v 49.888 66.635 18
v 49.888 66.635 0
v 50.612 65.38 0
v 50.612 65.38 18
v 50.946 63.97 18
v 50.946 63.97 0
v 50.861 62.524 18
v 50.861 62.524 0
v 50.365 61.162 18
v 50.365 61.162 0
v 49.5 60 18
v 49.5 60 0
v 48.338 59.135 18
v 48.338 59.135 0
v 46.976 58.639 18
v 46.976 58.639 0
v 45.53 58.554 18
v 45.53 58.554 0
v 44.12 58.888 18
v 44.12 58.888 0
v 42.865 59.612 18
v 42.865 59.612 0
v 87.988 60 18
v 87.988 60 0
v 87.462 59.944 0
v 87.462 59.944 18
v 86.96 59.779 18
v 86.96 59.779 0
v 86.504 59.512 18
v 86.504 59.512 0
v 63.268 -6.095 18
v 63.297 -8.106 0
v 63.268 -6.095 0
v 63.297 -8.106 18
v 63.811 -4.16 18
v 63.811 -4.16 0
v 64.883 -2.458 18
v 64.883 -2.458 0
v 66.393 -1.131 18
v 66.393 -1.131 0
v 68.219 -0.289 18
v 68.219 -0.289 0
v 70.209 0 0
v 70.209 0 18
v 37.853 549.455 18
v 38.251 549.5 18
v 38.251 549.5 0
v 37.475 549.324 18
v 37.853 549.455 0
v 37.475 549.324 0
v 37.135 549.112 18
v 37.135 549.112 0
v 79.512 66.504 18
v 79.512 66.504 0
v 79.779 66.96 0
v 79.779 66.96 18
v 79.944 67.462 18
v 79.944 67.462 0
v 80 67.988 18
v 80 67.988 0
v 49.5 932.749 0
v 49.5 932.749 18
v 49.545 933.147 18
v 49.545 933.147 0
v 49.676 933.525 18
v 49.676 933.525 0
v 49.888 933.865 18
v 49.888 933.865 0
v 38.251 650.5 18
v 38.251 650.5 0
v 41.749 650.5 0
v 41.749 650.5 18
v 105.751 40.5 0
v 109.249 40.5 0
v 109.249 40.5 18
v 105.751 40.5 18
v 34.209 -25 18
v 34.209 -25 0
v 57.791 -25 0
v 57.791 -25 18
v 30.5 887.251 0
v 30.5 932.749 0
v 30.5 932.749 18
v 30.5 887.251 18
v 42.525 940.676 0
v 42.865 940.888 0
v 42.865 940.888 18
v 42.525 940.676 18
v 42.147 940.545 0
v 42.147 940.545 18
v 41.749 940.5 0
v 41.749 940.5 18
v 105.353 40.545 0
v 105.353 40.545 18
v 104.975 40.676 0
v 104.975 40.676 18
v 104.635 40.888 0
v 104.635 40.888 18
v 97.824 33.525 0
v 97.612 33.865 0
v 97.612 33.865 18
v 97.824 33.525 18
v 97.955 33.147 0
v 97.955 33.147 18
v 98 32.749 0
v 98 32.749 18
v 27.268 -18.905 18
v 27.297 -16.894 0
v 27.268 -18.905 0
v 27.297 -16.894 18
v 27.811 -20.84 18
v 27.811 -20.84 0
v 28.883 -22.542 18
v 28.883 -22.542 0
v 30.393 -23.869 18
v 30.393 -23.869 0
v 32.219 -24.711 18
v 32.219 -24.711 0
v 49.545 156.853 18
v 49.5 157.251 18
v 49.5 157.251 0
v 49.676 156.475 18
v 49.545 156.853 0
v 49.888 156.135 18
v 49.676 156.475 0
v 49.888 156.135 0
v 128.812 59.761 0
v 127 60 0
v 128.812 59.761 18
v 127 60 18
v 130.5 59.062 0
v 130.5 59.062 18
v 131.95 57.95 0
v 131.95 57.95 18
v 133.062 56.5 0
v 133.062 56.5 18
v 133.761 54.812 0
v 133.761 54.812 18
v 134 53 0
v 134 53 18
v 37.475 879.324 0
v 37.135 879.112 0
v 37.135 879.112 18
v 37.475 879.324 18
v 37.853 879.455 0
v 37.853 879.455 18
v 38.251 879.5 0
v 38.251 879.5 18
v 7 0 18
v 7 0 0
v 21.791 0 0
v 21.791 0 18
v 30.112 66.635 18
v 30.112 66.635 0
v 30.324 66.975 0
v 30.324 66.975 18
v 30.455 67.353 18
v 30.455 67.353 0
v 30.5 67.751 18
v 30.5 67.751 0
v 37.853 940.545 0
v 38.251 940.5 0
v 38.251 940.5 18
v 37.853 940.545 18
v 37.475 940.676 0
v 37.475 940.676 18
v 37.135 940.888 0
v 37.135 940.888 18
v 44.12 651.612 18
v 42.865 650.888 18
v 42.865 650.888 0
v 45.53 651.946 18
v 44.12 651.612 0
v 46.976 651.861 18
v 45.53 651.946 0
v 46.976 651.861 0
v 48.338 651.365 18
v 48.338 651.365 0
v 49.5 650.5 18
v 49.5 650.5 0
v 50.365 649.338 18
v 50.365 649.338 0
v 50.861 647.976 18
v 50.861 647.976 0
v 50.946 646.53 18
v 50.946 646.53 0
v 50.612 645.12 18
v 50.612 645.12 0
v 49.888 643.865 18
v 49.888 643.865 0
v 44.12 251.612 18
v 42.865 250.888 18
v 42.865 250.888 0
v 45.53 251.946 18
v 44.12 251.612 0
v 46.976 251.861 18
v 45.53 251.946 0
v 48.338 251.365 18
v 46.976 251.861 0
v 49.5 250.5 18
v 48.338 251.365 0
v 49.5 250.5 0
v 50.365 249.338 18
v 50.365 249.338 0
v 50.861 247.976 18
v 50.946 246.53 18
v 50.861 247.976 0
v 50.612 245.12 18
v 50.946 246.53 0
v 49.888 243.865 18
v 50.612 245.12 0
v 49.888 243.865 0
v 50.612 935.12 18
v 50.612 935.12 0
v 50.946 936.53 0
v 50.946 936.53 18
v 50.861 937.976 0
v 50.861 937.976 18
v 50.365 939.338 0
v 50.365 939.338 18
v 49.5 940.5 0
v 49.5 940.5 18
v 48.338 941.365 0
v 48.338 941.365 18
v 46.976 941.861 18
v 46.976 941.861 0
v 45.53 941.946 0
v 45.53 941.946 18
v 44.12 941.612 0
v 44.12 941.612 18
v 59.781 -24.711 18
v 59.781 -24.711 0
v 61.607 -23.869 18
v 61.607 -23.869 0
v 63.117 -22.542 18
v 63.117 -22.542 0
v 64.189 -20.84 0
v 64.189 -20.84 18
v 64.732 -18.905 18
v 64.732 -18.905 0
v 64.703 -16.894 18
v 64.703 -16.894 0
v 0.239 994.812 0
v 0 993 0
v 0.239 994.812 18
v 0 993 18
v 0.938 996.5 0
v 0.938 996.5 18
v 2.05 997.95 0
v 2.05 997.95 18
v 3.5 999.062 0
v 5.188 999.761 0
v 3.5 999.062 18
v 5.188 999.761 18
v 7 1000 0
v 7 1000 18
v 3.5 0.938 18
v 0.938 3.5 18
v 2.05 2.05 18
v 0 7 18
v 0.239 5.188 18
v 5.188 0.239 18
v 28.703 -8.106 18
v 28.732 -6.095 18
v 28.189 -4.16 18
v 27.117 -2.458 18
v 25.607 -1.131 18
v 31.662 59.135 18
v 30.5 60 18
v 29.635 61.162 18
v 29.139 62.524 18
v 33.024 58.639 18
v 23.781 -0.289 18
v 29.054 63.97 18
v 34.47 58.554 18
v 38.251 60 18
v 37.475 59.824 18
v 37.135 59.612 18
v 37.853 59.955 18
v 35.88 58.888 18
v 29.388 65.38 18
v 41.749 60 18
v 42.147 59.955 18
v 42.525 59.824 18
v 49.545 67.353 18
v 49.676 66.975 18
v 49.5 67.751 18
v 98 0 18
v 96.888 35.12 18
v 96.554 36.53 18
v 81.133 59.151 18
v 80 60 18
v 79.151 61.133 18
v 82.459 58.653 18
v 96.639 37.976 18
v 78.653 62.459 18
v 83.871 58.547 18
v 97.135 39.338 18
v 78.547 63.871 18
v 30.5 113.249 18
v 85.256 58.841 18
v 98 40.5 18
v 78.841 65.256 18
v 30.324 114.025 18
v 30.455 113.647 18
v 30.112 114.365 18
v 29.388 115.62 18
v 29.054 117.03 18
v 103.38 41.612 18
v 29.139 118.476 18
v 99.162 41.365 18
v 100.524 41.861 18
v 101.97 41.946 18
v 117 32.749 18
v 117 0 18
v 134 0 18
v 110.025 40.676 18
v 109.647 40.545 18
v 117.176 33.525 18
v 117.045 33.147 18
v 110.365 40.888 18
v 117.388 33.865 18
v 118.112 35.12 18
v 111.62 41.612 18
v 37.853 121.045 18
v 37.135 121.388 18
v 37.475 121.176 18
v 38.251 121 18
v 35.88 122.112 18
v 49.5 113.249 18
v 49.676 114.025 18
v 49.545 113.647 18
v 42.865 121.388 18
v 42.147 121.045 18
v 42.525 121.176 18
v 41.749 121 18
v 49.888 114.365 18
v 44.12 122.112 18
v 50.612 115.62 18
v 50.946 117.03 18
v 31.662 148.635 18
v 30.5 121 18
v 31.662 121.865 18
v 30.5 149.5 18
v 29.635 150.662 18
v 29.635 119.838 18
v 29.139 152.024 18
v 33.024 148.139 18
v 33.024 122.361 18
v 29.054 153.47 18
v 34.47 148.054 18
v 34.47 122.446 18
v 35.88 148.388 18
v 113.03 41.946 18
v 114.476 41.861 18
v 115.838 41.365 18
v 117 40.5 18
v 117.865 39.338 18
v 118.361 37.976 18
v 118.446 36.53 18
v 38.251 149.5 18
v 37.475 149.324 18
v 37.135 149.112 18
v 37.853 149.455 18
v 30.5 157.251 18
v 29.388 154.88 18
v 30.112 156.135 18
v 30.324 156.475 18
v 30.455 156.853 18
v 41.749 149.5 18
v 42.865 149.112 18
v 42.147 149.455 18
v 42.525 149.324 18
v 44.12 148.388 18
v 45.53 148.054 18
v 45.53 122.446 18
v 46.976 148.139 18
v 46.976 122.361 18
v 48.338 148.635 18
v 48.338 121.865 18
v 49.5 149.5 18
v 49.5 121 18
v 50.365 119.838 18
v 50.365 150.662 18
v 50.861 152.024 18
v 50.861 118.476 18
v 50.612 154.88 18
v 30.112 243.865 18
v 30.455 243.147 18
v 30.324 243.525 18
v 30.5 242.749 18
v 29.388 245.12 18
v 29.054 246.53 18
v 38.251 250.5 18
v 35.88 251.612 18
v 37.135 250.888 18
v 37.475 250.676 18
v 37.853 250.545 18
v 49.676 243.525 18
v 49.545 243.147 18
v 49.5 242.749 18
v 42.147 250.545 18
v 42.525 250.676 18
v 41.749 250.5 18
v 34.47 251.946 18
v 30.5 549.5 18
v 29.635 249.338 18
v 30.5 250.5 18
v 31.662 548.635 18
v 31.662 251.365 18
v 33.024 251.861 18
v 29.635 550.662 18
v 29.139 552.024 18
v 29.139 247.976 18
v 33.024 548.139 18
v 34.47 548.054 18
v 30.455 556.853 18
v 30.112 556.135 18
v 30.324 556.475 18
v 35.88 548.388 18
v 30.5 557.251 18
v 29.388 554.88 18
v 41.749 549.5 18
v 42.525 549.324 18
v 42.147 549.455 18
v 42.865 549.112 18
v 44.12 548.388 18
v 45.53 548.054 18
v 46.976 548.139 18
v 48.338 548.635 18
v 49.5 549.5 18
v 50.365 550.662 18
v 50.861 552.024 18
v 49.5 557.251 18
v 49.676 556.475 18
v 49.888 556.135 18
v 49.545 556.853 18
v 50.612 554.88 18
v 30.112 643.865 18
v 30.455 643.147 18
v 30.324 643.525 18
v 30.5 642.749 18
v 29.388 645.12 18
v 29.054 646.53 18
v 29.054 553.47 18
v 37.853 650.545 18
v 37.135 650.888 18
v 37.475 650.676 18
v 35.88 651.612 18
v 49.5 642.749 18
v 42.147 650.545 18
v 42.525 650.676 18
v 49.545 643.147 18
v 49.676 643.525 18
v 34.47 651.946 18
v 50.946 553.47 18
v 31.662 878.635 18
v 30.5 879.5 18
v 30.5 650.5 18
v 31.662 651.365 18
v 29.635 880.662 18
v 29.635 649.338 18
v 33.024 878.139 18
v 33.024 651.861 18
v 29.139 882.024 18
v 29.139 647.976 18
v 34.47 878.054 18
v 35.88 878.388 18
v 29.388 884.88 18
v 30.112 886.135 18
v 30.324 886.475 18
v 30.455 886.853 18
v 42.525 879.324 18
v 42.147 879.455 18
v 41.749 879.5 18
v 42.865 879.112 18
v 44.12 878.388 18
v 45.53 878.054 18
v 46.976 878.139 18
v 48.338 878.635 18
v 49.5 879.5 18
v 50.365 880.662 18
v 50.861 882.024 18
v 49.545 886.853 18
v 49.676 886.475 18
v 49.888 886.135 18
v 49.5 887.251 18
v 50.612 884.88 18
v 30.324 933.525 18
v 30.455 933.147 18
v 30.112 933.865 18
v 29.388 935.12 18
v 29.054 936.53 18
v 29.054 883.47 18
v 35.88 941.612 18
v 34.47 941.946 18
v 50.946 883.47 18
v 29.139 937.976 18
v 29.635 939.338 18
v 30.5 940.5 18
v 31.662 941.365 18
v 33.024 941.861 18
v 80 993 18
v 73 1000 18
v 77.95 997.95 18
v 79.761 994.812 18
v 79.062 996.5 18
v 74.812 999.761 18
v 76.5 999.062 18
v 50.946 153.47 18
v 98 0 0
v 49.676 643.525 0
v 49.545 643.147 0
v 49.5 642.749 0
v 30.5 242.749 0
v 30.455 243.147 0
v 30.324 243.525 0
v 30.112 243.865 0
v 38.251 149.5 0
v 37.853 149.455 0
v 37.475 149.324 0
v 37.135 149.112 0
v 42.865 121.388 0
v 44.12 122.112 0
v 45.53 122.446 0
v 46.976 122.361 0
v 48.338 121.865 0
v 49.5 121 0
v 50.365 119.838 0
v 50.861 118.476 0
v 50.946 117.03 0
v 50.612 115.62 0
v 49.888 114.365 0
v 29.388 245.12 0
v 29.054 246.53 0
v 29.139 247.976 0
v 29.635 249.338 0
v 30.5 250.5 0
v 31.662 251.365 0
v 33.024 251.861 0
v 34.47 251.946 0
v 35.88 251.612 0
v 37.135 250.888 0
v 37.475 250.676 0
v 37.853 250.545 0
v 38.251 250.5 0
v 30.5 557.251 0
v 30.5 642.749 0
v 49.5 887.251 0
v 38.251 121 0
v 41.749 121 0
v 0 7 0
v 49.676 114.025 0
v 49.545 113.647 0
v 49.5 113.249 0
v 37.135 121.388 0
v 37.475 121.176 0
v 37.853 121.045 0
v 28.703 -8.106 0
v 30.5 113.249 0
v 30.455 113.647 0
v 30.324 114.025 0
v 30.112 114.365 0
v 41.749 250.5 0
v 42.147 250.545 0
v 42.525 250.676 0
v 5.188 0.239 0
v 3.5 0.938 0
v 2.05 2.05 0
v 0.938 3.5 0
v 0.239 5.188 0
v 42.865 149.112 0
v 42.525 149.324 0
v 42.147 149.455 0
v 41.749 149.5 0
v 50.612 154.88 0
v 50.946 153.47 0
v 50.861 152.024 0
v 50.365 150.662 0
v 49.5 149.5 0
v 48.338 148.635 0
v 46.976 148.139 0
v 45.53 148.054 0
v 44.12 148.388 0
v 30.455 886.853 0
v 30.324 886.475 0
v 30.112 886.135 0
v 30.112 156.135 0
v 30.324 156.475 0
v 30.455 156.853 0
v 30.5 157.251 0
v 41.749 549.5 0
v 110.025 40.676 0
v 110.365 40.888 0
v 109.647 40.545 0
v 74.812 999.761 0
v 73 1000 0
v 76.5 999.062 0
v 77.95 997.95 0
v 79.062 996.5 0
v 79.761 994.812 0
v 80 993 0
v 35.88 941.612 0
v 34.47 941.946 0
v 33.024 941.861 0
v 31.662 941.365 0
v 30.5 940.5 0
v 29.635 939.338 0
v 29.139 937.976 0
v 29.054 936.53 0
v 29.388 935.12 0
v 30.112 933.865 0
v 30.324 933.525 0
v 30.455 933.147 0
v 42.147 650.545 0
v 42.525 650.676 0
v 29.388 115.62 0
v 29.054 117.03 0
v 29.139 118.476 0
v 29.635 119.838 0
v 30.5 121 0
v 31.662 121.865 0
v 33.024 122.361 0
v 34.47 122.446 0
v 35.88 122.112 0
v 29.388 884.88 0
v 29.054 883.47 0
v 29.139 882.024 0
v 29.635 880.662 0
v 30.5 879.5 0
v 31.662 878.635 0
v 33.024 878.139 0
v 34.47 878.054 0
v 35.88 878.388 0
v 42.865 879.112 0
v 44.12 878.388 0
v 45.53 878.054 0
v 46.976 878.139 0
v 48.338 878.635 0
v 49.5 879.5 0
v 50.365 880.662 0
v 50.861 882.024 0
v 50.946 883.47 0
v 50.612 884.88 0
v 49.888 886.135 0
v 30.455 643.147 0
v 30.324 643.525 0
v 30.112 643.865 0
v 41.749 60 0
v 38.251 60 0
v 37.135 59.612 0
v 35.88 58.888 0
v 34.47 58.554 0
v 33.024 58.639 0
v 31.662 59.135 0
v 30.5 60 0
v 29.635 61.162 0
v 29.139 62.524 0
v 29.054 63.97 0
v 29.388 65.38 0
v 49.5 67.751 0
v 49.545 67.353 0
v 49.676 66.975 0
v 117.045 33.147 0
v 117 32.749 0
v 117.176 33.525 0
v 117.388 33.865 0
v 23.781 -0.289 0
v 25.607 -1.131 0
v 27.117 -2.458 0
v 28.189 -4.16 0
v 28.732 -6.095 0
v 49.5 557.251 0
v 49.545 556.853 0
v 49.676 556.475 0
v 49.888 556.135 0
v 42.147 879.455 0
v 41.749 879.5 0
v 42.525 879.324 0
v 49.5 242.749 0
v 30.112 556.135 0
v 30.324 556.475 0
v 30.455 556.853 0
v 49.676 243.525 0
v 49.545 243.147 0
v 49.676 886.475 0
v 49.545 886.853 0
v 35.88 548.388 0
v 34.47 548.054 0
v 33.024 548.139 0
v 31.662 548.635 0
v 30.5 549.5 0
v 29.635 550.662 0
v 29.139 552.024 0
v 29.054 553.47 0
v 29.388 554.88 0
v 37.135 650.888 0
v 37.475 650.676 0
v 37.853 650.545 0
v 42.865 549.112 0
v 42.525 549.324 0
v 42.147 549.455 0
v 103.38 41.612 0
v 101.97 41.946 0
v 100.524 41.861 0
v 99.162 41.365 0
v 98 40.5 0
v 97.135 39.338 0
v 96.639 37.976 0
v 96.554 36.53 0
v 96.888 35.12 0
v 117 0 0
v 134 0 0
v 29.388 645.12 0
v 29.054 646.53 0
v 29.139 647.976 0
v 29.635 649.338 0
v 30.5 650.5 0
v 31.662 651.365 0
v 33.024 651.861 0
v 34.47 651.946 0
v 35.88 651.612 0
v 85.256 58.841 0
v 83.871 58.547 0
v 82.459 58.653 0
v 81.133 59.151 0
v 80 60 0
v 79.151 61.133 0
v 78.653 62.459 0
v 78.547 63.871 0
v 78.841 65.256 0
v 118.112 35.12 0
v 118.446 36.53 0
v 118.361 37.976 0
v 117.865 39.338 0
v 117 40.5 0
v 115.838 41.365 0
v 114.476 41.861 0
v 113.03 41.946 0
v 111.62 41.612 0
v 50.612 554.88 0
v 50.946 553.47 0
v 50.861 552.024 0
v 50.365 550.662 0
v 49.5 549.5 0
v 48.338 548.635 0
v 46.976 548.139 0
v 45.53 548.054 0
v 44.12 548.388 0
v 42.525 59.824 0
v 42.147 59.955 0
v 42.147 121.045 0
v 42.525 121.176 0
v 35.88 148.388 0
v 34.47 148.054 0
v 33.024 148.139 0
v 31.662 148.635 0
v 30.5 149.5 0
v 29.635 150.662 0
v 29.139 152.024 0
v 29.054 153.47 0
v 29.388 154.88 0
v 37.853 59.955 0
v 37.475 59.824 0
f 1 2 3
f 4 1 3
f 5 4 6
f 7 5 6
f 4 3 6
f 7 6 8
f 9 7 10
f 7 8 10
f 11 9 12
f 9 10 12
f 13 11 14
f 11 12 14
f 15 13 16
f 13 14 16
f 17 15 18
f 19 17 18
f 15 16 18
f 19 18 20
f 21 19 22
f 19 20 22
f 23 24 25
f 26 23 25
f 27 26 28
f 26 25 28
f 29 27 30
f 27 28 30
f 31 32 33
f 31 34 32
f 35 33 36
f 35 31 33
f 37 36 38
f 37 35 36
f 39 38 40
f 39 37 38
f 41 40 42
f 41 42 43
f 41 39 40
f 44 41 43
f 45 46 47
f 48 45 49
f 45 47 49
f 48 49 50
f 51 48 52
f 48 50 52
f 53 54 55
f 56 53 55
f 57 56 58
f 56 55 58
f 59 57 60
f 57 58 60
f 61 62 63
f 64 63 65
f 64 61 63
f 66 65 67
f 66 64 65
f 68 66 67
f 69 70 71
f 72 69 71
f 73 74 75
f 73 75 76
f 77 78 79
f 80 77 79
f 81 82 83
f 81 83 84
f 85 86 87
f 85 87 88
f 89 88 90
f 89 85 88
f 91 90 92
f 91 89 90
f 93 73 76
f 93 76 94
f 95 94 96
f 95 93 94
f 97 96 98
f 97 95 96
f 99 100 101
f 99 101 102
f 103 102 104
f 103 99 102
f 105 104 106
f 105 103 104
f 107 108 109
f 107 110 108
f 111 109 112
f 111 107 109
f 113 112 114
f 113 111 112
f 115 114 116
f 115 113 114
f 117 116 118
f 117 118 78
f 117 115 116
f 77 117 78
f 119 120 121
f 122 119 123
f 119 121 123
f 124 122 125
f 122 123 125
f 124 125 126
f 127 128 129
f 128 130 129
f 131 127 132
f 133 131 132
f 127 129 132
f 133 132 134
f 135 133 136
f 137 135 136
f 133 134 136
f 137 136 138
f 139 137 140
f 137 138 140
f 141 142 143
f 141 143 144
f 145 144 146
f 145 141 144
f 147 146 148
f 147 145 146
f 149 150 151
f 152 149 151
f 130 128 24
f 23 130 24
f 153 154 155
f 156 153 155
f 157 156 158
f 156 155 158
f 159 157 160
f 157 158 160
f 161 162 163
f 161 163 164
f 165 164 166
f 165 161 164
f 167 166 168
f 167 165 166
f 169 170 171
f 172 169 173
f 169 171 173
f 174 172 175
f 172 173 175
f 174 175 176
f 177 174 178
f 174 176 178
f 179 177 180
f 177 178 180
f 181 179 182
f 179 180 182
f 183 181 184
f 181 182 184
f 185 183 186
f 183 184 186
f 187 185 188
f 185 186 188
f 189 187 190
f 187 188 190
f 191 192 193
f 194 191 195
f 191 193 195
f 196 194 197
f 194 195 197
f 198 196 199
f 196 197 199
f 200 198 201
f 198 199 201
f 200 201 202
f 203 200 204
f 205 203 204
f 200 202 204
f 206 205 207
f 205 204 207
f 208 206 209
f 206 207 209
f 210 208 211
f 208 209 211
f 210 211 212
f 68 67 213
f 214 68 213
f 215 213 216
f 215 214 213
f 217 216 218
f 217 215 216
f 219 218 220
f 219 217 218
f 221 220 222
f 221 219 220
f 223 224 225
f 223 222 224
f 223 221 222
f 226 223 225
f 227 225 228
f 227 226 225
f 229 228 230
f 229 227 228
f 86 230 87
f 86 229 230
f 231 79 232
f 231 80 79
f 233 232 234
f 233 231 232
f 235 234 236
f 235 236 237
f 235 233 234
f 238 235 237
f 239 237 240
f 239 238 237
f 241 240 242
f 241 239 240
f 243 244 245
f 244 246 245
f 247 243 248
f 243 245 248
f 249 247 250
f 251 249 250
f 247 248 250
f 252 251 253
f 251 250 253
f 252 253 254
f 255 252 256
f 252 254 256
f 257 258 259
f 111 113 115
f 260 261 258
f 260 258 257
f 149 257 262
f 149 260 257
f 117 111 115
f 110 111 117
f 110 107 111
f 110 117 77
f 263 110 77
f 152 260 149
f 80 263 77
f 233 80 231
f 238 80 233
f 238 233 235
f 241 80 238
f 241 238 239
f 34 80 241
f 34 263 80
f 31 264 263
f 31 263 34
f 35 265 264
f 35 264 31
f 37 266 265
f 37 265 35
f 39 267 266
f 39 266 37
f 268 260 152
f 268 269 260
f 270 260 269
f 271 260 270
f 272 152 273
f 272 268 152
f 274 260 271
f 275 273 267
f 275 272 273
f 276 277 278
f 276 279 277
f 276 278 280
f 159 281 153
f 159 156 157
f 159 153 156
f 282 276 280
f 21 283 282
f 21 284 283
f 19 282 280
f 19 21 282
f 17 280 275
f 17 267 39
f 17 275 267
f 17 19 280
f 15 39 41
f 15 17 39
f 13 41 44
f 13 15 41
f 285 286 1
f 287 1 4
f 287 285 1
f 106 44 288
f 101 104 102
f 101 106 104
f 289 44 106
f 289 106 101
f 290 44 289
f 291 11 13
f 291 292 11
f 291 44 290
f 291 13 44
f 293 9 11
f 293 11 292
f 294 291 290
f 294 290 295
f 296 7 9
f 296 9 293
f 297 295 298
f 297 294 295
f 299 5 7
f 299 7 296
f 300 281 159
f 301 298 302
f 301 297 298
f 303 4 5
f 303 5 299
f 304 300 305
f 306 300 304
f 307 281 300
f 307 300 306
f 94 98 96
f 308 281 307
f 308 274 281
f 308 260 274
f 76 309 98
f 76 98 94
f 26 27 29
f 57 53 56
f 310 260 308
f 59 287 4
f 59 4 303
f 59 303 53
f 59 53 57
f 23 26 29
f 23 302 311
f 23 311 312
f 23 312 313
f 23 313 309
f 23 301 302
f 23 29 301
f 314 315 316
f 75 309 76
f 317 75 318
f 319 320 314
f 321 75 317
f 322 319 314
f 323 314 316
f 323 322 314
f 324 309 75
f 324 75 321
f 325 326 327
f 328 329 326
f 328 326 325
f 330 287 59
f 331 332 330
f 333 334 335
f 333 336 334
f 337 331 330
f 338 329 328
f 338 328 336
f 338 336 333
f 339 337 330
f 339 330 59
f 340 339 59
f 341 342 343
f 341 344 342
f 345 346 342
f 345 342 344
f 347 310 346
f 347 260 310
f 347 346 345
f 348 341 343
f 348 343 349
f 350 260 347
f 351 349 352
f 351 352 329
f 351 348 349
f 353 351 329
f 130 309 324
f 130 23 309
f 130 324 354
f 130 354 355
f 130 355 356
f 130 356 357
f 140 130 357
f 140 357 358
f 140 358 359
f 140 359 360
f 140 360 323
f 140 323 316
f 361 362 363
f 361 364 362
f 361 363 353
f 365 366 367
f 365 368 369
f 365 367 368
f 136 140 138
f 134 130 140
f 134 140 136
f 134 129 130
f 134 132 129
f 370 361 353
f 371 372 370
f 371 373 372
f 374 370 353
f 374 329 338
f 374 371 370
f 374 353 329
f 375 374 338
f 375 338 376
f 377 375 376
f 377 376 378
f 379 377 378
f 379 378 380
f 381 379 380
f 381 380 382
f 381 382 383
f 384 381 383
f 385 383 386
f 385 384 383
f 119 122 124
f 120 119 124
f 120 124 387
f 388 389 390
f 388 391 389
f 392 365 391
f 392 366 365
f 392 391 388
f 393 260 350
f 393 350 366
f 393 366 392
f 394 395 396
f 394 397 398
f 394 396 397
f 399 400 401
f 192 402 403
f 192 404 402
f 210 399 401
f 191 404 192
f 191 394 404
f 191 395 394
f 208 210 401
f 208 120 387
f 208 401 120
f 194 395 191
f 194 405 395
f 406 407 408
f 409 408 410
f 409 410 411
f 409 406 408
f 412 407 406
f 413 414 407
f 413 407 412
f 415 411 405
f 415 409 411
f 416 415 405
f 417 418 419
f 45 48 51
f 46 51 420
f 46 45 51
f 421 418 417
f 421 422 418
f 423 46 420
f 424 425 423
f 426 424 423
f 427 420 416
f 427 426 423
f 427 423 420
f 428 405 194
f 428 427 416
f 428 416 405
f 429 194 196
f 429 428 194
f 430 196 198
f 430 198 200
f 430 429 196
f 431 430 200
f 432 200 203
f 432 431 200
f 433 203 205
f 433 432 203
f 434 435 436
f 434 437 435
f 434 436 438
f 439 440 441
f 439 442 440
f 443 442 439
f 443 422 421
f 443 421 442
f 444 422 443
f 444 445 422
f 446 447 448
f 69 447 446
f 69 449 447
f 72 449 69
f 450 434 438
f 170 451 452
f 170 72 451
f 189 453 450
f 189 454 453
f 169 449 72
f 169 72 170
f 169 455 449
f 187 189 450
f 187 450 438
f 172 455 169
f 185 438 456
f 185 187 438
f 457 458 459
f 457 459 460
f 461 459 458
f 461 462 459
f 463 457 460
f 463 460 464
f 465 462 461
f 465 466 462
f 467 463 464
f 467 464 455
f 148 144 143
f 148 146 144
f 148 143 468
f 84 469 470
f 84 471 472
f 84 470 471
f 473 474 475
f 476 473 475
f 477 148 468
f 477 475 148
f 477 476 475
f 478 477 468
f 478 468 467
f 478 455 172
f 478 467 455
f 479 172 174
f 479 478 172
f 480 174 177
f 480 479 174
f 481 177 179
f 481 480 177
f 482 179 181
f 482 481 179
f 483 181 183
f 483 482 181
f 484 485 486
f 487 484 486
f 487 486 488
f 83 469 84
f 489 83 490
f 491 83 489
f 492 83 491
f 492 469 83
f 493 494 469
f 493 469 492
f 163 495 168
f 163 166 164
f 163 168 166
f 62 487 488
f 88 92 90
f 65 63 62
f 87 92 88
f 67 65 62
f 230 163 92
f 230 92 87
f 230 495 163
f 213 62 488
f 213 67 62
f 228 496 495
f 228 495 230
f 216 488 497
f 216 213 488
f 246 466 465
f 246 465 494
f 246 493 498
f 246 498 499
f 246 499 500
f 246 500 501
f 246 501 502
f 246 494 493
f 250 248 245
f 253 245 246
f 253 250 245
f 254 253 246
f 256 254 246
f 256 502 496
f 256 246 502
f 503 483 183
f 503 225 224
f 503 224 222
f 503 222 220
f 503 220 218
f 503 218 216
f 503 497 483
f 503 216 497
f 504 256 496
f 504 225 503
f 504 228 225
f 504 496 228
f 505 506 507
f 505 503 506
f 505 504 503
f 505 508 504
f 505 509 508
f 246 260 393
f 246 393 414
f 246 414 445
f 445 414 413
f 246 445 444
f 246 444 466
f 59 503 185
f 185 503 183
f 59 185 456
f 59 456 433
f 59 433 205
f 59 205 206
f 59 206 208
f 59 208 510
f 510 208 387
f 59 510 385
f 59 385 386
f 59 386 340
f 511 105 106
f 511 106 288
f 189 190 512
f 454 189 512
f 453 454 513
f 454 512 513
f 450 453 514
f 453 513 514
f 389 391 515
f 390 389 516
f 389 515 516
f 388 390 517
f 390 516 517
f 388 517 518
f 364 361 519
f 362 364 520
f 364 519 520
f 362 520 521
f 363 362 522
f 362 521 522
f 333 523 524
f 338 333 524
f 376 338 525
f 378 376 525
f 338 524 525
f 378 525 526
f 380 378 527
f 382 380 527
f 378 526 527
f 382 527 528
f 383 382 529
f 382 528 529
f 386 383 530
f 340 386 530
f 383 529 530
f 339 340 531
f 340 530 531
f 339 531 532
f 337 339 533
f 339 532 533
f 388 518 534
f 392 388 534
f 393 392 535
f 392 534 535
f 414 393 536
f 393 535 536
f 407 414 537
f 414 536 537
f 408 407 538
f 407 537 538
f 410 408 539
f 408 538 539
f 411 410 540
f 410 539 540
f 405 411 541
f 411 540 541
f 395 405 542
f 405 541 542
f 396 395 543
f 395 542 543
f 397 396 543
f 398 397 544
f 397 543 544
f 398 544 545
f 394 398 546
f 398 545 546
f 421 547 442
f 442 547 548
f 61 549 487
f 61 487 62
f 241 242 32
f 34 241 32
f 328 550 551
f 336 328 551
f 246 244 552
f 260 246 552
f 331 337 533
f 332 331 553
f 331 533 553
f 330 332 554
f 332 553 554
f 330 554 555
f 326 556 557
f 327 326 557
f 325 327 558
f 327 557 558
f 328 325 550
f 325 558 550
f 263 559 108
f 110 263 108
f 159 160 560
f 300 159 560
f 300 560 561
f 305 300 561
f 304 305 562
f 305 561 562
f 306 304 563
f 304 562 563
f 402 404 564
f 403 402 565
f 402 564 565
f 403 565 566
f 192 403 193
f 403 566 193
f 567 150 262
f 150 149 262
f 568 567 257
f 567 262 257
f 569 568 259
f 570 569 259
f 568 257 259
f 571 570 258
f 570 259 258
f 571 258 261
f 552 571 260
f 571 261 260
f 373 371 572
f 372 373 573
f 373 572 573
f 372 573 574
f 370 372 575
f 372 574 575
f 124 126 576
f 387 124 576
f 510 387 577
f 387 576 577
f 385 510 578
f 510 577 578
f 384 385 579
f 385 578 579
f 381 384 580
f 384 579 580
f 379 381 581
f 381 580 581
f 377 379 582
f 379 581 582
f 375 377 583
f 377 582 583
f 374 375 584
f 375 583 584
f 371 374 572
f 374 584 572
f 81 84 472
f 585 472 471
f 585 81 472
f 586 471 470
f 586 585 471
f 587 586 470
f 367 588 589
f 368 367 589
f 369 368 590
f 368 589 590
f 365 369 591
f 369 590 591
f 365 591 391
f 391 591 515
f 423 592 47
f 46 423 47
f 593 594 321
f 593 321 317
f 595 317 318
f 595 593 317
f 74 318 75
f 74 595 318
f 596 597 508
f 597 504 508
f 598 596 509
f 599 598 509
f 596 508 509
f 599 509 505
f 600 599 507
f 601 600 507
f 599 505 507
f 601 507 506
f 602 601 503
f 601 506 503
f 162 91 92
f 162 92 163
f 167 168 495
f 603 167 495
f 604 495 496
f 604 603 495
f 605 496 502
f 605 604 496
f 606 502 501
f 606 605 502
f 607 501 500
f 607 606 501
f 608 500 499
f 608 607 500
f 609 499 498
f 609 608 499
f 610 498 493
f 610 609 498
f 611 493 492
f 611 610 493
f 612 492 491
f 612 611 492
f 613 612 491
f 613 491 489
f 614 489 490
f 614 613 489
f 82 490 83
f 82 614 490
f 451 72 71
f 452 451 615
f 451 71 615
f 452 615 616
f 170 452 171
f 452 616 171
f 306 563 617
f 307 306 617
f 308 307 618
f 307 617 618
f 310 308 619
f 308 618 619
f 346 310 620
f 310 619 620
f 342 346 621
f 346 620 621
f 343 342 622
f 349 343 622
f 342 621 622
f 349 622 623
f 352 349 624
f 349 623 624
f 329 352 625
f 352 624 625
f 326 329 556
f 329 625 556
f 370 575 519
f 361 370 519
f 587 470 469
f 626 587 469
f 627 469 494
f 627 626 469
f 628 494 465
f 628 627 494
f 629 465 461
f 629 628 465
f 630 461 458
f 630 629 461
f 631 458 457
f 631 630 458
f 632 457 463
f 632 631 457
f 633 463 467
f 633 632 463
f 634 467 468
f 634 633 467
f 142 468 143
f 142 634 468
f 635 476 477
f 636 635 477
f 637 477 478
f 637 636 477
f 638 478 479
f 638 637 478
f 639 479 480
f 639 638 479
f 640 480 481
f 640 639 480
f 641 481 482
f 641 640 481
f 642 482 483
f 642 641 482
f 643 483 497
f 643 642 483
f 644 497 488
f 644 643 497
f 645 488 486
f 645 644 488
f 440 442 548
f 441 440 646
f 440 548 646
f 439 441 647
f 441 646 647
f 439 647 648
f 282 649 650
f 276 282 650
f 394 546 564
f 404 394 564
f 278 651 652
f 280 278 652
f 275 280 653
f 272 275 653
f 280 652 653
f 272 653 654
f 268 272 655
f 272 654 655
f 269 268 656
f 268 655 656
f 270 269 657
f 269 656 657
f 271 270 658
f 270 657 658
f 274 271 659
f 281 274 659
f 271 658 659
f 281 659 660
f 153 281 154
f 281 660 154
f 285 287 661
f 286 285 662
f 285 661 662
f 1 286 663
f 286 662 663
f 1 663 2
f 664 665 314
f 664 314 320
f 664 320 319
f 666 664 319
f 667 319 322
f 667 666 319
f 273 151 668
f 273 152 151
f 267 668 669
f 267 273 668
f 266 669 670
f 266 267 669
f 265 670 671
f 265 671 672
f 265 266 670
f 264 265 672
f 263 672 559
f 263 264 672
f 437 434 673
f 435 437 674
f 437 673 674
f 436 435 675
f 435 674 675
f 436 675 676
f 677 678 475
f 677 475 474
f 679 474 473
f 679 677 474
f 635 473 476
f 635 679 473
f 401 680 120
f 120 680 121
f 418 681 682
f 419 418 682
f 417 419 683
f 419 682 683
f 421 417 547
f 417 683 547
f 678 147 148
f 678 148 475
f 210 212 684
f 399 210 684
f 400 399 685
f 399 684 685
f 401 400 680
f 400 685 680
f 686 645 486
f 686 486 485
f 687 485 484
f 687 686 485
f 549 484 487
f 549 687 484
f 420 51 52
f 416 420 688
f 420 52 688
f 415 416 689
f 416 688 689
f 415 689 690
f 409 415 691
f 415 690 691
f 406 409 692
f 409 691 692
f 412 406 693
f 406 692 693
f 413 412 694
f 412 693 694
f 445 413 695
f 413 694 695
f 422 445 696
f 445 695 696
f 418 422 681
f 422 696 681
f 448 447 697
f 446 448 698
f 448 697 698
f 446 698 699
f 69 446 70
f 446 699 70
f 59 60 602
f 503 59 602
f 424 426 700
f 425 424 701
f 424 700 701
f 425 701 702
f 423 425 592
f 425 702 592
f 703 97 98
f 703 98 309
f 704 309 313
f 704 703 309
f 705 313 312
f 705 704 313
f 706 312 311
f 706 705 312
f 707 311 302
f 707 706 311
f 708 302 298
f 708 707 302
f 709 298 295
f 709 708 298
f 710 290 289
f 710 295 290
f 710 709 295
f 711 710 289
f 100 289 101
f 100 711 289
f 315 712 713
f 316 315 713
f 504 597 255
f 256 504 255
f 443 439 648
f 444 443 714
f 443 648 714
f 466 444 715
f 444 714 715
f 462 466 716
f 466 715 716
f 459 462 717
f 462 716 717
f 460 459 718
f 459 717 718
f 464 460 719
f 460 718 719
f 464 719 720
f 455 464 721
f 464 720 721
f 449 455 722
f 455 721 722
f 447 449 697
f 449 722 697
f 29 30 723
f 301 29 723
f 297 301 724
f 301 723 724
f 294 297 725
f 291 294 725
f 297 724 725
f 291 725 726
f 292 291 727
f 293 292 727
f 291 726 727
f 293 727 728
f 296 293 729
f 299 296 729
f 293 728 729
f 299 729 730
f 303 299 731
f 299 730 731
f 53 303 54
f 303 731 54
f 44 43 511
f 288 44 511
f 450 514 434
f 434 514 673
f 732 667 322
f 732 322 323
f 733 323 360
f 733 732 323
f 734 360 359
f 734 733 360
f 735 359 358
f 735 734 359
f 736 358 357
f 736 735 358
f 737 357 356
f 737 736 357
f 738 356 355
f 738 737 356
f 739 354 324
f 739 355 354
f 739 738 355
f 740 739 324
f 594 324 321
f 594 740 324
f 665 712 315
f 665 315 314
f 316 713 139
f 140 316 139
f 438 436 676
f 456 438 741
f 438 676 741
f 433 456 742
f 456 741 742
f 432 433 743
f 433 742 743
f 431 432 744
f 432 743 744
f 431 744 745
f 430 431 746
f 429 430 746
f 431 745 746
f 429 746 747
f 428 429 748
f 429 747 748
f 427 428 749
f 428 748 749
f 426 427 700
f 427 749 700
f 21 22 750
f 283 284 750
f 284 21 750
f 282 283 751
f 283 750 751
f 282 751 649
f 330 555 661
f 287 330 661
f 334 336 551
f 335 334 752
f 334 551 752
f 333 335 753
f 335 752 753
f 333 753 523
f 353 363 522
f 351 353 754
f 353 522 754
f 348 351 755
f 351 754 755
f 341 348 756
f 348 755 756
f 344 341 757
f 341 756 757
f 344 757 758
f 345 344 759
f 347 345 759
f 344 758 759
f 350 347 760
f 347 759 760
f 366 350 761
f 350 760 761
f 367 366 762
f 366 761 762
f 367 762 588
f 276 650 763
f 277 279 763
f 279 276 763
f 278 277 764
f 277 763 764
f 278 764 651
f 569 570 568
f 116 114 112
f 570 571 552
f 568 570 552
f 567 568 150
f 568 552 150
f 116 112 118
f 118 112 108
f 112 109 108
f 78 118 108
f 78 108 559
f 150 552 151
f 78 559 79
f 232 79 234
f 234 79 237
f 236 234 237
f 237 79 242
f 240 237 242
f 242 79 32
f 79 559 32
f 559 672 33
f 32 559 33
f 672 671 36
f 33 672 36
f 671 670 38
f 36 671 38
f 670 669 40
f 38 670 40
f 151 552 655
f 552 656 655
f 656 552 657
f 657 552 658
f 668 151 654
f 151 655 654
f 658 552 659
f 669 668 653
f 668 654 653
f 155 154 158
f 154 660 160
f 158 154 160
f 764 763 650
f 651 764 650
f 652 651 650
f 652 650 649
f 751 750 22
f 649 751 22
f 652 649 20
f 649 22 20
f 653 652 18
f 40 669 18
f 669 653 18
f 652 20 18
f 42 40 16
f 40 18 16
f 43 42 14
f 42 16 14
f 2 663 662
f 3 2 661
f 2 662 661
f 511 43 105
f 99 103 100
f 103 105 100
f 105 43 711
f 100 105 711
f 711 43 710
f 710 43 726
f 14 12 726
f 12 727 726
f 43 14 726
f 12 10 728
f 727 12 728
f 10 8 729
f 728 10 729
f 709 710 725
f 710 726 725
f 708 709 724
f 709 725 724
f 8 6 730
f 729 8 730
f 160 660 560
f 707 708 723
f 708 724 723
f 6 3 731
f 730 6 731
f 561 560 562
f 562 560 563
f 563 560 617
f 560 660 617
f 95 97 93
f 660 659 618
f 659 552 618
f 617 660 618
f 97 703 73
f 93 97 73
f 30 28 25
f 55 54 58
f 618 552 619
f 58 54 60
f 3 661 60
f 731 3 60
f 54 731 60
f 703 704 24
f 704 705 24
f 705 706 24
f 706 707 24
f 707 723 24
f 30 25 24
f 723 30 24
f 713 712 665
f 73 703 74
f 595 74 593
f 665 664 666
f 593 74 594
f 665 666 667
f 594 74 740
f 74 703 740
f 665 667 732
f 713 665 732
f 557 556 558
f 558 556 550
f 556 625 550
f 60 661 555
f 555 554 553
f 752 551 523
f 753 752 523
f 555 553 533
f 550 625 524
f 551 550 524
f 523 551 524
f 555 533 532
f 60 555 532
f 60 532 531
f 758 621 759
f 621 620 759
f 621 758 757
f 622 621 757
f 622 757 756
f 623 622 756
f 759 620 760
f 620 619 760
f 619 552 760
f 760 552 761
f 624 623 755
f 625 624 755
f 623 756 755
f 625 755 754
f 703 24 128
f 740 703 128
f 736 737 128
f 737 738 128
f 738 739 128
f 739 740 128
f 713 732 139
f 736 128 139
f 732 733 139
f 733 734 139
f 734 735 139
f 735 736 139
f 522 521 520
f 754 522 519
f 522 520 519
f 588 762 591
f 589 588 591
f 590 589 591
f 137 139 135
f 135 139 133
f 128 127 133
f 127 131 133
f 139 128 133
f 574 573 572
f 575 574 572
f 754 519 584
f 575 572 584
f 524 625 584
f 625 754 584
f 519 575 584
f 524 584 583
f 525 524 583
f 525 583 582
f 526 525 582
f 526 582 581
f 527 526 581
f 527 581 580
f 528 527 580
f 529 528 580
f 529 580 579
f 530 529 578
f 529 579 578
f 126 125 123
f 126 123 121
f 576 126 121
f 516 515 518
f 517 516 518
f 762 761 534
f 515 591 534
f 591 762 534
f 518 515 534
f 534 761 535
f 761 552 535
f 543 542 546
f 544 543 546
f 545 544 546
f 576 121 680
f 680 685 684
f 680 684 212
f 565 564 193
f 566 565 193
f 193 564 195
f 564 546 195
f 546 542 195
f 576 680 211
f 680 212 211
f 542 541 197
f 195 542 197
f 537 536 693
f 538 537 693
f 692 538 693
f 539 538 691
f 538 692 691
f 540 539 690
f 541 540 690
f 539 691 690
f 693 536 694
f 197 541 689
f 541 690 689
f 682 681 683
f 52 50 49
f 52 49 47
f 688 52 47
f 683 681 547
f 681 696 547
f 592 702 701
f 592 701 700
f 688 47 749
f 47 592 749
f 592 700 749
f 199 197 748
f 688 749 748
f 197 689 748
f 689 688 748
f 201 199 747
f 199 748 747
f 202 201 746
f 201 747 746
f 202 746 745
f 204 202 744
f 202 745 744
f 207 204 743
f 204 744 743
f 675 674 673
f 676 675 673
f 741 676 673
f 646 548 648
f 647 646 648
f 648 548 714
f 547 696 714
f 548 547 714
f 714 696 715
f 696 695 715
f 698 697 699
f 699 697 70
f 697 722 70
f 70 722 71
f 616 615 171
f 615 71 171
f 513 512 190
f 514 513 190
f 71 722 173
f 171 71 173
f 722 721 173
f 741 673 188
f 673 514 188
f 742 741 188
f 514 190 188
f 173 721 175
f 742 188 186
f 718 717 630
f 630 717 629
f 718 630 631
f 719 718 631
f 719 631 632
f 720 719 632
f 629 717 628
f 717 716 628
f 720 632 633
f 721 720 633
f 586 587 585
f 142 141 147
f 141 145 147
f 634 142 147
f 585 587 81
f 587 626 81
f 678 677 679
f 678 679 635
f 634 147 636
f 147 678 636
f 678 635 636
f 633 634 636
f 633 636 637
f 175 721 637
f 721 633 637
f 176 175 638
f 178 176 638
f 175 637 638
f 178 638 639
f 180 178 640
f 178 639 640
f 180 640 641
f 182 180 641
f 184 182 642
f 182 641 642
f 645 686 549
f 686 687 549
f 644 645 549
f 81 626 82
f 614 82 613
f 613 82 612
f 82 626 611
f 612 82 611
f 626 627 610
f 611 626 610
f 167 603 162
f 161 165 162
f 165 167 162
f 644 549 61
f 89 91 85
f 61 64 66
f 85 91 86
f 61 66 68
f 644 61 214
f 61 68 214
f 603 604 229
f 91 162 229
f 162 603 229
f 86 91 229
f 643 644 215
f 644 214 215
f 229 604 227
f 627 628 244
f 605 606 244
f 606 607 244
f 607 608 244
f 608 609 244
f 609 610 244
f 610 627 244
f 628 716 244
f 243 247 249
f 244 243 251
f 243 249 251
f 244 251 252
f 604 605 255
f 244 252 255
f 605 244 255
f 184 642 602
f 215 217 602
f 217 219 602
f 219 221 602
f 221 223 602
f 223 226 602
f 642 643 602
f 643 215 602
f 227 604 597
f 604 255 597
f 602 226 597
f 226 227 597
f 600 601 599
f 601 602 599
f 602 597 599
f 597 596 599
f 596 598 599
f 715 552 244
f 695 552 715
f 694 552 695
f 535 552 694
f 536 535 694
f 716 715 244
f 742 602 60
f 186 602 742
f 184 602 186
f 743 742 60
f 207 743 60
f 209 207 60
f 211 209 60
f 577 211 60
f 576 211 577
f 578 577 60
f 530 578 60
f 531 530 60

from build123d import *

# Parameters (mm, degrees)
BOSS_EXTRUDE1_DEPTH = 18
CUT_EXTRUDE1_DEPTH  = 19
CUT_EXTRUDE2_DEPTH  = 19
CUT_EXTRUDE3_DEPTH  = 19
LPATTERN1_COUNT     = 2
LPATTERN1_PITCH     = 400
FILLET1_R           = 7


with BuildPart() as part:
    # Sketch1 → Boss-Extrude1 (new body)
    with BuildSketch(Plane.XY):
        with BuildLine():
            Line((0, 0), (30, 0))
            Line((30, 0), (26, -25))
            Line((26, -25), (66, -25))
            Line((66, -25), (62, 0))
            Line((62, 0), (134, 0))
            Line((134, 0), (134, 60))
            Line((134, 60), (87.987761491, 60))
            ThreePointArc((87.987761491, 60), (87.206612206, 59.874827529), (86.503685629, 59.511844635))
            ThreePointArc((86.503685629, 59.511844635), (80, 60), (79.511844635, 66.503685629))
            ThreePointArc((79.511844635, 66.503685629), (79.874827529, 67.206612206), (80, 67.987761491))
            Line((80, 67.987761491), (80, 1000))
            Line((80, 1000), (0, 1000))
            Line((0, 1000), (0, 0))
        make_face()
    extrude(amount=BOSS_EXTRUDE1_DEPTH)

    # Sketch2 → Cut-Extrude1 (cut, through all)
    with BuildSketch(Plane.XY):
        with BuildLine():
            Line((49.5, 642.748771852), (49.5, 557.251228148))
            ThreePointArc((49.5, 557.251228148), (49.599672829, 556.660561143), (49.88765279, 556.135309084))
            ThreePointArc((49.88765279, 556.135309084), (49.5, 549.5), (42.864690916, 549.11234721))
            ThreePointArc((42.864690916, 549.11234721), (42.339438857, 549.400327171), (41.748771852, 549.5))
            Line((41.748771852, 549.5), (38.251228148, 549.5))
            ThreePointArc((38.251228148, 549.5), (37.660561143, 549.400327171), (37.135309084, 549.11234721))
            ThreePointArc((37.135309084, 549.11234721), (30.5, 549.5), (30.11234721, 556.135309084))
            ThreePointArc((30.11234721, 556.135309084), (30.400327171, 556.660561143), (30.5, 557.251228148))
            Line((30.5, 557.251228148), (30.5, 642.748771852))
            ThreePointArc((30.5, 642.748771852), (30.400327171, 643.339438857), (30.11234721, 643.864690916))
            ThreePointArc((30.11234721, 643.864690916), (30.5, 650.5), (37.135309084, 650.88765279))
            ThreePointArc((37.135309084, 650.88765279), (37.660561143, 650.599672829), (38.251228148, 650.5))
            Line((38.251228148, 650.5), (41.748771852, 650.5))
            ThreePointArc((41.748771852, 650.5), (42.339438857, 650.599672829), (42.864690916, 650.88765279))
            ThreePointArc((42.864690916, 650.88765279), (49.5, 650.5), (49.88765279, 643.864690916))
            ThreePointArc((49.88765279, 643.864690916), (49.599672829, 643.339438857), (49.5, 642.748771852))
        make_face()
    cut_extrude1 = extrude(amount=CUT_EXTRUDE1_DEPTH, mode=Mode.SUBTRACT)

    # Sketch3 → Cut-Extrude2 (cut, through all)
    with BuildSketch(Plane.XY):
        with BuildLine():
            Line((98, 0), (117, 0))
            Line((117, 0), (117, 32.748771852))
            ThreePointArc((117, 32.748771852), (117.099672829, 33.339438857), (117.38765279, 33.864690916))
            ThreePointArc((117.38765279, 33.864690916), (117, 40.5), (110.364690916, 40.88765279))
            ThreePointArc((110.364690916, 40.88765279), (109.839438857, 40.599672829), (109.248771852, 40.5))
            Line((109.248771852, 40.5), (105.751228148, 40.5))
            ThreePointArc((105.751228148, 40.5), (105.160561143, 40.599672829), (104.635309084, 40.88765279))
            ThreePointArc((104.635309084, 40.88765279), (98, 40.5), (97.61234721, 33.864690916))
            ThreePointArc((97.61234721, 33.864690916), (97.900327171, 33.339438857), (98, 32.748771852))
            Line((98, 32.748771852), (98, 0))
        make_face()
    extrude(amount=CUT_EXTRUDE2_DEPTH, mode=Mode.SUBTRACT)

    # Sketch4 → Cut-Extrude3 (cut, through all)
    with BuildSketch(Plane.XY):
        with BuildLine():
            Line((49.5, 113.248771852), (49.5, 67.751228148))
            ThreePointArc((49.5, 67.751228148), (49.599672829, 67.160561143), (49.88765279, 66.635309084))
            ThreePointArc((49.88765279, 66.635309084), (49.5, 60), (42.864690916, 59.61234721))
            ThreePointArc((42.864690916, 59.61234721), (42.339438857, 59.900327171), (41.748771852, 60))
            Line((41.748771852, 60), (38.251228148, 60))
            ThreePointArc((38.251228148, 60), (37.660561143, 59.900327171), (37.135309084, 59.61234721))
            ThreePointArc((37.135309084, 59.61234721), (30.5, 60), (30.11234721, 66.635309084))
            ThreePointArc((30.11234721, 66.635309084), (30.400327171, 67.160561143), (30.5, 67.751228148))
            Line((30.5, 67.751228148), (30.5, 113.248771852))
            ThreePointArc((30.5, 113.248771852), (30.400327171, 113.839438857), (30.11234721, 114.364690916))
            ThreePointArc((30.11234721, 114.364690916), (30.5, 121), (37.135309084, 121.38765279))
            ThreePointArc((37.135309084, 121.38765279), (37.660561143, 121.099672829), (38.251228148, 121))
            Line((38.251228148, 121), (41.748771852, 121))
            ThreePointArc((41.748771852, 121), (42.339438857, 121.099672829), (42.864690916, 121.38765279))
            ThreePointArc((42.864690916, 121.38765279), (49.5, 121), (49.88765279, 114.364690916))
            ThreePointArc((49.88765279, 114.364690916), (49.599672829, 113.839438857), (49.5, 113.248771852))
        make_face()
        with BuildLine():
            Line((38.251228148, 879.5), (41.748771852, 879.5))
            ThreePointArc((41.748771852, 879.5), (42.339438857, 879.400327171), (42.864690916, 879.11234721))
            ThreePointArc((42.864690916, 879.11234721), (49.5, 879.5), (49.88765279, 886.135309084))
            ThreePointArc((49.88765279, 886.135309084), (49.599672829, 886.660561143), (49.5, 887.251228148))
            Line((49.5, 887.251228148), (49.5, 932.748771852))
            ThreePointArc((49.5, 932.748771852), (49.599672829, 933.339438857), (49.88765279, 933.864690916))
            ThreePointArc((49.88765279, 933.864690916), (49.5, 940.5), (42.864690916, 940.88765279))
            ThreePointArc((42.864690916, 940.88765279), (42.339438857, 940.599672829), (41.748771852, 940.5))
            Line((41.748771852, 940.5), (38.251228148, 940.5))
            ThreePointArc((38.251228148, 940.5), (37.660561143, 940.599672829), (37.135309084, 940.88765279))
            ThreePointArc((37.135309084, 940.88765279), (30.5, 940.5), (30.11234721, 933.864690916))
            ThreePointArc((30.11234721, 933.864690916), (30.400327171, 933.339438857), (30.5, 932.748771852))
            Line((30.5, 932.748771852), (30.5, 887.251228148))
            ThreePointArc((30.5, 887.251228148), (30.400327171, 886.660561143), (30.11234721, 886.135309084))
            ThreePointArc((30.11234721, 886.135309084), (30.5, 879.5), (37.135309084, 879.11234721))
            ThreePointArc((37.135309084, 879.11234721), (37.660561143, 879.400327171), (38.251228148, 879.5))
        make_face()
    extrude(amount=CUT_EXTRUDE3_DEPTH, mode=Mode.SUBTRACT)

    # LPattern1: Cut-Extrude1 ×2
    with Locations(*[(0, -i * LPATTERN1_PITCH, 0) for i in range(1, LPATTERN1_COUNT)]):
        add(cut_extrude1, mode=Mode.SUBTRACT)

    # Fillet1
    fillet1_edges = [part.edges().sort_by_distance(p)[0] for p in [
        (0, 0, 9),
        (0, 1000, 9),
        (80, 1000, 9),
        (134, 60, 9),
        (62, 0, 9),
        (66, -25, 9),
        (26, -25, 9),
        (30, 0, 9),
    ]]
    fillet(fillet1_edges, radius=FILLET1_R)


solid = part.part
